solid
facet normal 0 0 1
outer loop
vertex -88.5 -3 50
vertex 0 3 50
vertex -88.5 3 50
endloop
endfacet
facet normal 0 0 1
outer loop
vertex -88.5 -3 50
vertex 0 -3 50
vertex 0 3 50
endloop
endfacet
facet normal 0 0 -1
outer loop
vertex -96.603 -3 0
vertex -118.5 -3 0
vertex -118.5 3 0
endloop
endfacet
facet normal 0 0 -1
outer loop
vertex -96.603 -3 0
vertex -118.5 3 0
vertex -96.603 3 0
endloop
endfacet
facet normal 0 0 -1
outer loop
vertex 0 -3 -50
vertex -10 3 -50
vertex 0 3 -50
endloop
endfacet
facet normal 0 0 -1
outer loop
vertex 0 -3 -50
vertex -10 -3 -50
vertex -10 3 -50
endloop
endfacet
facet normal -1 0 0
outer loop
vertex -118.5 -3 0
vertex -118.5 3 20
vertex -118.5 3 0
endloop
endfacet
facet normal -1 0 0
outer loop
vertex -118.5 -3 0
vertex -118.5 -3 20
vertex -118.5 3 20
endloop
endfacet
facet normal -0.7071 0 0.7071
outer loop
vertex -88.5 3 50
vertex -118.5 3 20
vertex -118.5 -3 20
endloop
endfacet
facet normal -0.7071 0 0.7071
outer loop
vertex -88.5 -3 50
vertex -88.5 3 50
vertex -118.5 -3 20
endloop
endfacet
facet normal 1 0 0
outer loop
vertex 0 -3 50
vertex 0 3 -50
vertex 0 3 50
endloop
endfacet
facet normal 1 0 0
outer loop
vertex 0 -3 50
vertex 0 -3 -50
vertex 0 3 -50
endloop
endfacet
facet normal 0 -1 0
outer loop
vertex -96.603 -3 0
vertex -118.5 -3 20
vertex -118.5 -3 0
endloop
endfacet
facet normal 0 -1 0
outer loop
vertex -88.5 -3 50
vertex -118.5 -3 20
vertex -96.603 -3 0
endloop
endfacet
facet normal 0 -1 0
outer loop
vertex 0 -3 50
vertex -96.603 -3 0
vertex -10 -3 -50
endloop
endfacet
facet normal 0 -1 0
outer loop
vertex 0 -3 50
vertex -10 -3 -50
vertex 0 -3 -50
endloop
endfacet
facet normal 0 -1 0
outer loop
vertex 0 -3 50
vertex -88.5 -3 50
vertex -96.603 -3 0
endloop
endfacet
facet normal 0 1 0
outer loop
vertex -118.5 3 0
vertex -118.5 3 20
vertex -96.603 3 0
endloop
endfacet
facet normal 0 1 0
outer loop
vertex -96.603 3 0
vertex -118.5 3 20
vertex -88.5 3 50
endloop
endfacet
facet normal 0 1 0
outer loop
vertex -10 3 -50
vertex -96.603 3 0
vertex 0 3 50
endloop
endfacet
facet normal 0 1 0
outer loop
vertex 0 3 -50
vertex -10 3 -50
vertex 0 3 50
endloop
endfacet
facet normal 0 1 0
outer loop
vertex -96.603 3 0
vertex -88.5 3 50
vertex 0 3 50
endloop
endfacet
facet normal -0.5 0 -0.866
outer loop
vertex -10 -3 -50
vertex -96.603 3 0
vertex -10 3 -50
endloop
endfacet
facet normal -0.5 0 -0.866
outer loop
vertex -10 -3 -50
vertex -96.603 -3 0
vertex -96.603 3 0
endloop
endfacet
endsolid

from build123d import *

# Parameters (mm, degrees)
F1_DEPTH = 3
F2_SIZE  = 30


with BuildPart() as f1:
    # F0 (on Front) → F1 (new body, symmetric)
    with BuildSketch(Plane.XZ):
        Polygon((0, -50), (0, 50), (-118.5, 50), (-118.5, 0), (-96.60254, 0), (-10, -50), align=None)
    extrude(amount=F1_DEPTH, both=True)

    # F2
    f2_edges = [f1.edges().sort_by_distance(p)[0] for p in [
        (-118.5, 0, 50),
    ]]
    chamfer(f2_edges, length=F2_SIZE)


solid = f1.part
